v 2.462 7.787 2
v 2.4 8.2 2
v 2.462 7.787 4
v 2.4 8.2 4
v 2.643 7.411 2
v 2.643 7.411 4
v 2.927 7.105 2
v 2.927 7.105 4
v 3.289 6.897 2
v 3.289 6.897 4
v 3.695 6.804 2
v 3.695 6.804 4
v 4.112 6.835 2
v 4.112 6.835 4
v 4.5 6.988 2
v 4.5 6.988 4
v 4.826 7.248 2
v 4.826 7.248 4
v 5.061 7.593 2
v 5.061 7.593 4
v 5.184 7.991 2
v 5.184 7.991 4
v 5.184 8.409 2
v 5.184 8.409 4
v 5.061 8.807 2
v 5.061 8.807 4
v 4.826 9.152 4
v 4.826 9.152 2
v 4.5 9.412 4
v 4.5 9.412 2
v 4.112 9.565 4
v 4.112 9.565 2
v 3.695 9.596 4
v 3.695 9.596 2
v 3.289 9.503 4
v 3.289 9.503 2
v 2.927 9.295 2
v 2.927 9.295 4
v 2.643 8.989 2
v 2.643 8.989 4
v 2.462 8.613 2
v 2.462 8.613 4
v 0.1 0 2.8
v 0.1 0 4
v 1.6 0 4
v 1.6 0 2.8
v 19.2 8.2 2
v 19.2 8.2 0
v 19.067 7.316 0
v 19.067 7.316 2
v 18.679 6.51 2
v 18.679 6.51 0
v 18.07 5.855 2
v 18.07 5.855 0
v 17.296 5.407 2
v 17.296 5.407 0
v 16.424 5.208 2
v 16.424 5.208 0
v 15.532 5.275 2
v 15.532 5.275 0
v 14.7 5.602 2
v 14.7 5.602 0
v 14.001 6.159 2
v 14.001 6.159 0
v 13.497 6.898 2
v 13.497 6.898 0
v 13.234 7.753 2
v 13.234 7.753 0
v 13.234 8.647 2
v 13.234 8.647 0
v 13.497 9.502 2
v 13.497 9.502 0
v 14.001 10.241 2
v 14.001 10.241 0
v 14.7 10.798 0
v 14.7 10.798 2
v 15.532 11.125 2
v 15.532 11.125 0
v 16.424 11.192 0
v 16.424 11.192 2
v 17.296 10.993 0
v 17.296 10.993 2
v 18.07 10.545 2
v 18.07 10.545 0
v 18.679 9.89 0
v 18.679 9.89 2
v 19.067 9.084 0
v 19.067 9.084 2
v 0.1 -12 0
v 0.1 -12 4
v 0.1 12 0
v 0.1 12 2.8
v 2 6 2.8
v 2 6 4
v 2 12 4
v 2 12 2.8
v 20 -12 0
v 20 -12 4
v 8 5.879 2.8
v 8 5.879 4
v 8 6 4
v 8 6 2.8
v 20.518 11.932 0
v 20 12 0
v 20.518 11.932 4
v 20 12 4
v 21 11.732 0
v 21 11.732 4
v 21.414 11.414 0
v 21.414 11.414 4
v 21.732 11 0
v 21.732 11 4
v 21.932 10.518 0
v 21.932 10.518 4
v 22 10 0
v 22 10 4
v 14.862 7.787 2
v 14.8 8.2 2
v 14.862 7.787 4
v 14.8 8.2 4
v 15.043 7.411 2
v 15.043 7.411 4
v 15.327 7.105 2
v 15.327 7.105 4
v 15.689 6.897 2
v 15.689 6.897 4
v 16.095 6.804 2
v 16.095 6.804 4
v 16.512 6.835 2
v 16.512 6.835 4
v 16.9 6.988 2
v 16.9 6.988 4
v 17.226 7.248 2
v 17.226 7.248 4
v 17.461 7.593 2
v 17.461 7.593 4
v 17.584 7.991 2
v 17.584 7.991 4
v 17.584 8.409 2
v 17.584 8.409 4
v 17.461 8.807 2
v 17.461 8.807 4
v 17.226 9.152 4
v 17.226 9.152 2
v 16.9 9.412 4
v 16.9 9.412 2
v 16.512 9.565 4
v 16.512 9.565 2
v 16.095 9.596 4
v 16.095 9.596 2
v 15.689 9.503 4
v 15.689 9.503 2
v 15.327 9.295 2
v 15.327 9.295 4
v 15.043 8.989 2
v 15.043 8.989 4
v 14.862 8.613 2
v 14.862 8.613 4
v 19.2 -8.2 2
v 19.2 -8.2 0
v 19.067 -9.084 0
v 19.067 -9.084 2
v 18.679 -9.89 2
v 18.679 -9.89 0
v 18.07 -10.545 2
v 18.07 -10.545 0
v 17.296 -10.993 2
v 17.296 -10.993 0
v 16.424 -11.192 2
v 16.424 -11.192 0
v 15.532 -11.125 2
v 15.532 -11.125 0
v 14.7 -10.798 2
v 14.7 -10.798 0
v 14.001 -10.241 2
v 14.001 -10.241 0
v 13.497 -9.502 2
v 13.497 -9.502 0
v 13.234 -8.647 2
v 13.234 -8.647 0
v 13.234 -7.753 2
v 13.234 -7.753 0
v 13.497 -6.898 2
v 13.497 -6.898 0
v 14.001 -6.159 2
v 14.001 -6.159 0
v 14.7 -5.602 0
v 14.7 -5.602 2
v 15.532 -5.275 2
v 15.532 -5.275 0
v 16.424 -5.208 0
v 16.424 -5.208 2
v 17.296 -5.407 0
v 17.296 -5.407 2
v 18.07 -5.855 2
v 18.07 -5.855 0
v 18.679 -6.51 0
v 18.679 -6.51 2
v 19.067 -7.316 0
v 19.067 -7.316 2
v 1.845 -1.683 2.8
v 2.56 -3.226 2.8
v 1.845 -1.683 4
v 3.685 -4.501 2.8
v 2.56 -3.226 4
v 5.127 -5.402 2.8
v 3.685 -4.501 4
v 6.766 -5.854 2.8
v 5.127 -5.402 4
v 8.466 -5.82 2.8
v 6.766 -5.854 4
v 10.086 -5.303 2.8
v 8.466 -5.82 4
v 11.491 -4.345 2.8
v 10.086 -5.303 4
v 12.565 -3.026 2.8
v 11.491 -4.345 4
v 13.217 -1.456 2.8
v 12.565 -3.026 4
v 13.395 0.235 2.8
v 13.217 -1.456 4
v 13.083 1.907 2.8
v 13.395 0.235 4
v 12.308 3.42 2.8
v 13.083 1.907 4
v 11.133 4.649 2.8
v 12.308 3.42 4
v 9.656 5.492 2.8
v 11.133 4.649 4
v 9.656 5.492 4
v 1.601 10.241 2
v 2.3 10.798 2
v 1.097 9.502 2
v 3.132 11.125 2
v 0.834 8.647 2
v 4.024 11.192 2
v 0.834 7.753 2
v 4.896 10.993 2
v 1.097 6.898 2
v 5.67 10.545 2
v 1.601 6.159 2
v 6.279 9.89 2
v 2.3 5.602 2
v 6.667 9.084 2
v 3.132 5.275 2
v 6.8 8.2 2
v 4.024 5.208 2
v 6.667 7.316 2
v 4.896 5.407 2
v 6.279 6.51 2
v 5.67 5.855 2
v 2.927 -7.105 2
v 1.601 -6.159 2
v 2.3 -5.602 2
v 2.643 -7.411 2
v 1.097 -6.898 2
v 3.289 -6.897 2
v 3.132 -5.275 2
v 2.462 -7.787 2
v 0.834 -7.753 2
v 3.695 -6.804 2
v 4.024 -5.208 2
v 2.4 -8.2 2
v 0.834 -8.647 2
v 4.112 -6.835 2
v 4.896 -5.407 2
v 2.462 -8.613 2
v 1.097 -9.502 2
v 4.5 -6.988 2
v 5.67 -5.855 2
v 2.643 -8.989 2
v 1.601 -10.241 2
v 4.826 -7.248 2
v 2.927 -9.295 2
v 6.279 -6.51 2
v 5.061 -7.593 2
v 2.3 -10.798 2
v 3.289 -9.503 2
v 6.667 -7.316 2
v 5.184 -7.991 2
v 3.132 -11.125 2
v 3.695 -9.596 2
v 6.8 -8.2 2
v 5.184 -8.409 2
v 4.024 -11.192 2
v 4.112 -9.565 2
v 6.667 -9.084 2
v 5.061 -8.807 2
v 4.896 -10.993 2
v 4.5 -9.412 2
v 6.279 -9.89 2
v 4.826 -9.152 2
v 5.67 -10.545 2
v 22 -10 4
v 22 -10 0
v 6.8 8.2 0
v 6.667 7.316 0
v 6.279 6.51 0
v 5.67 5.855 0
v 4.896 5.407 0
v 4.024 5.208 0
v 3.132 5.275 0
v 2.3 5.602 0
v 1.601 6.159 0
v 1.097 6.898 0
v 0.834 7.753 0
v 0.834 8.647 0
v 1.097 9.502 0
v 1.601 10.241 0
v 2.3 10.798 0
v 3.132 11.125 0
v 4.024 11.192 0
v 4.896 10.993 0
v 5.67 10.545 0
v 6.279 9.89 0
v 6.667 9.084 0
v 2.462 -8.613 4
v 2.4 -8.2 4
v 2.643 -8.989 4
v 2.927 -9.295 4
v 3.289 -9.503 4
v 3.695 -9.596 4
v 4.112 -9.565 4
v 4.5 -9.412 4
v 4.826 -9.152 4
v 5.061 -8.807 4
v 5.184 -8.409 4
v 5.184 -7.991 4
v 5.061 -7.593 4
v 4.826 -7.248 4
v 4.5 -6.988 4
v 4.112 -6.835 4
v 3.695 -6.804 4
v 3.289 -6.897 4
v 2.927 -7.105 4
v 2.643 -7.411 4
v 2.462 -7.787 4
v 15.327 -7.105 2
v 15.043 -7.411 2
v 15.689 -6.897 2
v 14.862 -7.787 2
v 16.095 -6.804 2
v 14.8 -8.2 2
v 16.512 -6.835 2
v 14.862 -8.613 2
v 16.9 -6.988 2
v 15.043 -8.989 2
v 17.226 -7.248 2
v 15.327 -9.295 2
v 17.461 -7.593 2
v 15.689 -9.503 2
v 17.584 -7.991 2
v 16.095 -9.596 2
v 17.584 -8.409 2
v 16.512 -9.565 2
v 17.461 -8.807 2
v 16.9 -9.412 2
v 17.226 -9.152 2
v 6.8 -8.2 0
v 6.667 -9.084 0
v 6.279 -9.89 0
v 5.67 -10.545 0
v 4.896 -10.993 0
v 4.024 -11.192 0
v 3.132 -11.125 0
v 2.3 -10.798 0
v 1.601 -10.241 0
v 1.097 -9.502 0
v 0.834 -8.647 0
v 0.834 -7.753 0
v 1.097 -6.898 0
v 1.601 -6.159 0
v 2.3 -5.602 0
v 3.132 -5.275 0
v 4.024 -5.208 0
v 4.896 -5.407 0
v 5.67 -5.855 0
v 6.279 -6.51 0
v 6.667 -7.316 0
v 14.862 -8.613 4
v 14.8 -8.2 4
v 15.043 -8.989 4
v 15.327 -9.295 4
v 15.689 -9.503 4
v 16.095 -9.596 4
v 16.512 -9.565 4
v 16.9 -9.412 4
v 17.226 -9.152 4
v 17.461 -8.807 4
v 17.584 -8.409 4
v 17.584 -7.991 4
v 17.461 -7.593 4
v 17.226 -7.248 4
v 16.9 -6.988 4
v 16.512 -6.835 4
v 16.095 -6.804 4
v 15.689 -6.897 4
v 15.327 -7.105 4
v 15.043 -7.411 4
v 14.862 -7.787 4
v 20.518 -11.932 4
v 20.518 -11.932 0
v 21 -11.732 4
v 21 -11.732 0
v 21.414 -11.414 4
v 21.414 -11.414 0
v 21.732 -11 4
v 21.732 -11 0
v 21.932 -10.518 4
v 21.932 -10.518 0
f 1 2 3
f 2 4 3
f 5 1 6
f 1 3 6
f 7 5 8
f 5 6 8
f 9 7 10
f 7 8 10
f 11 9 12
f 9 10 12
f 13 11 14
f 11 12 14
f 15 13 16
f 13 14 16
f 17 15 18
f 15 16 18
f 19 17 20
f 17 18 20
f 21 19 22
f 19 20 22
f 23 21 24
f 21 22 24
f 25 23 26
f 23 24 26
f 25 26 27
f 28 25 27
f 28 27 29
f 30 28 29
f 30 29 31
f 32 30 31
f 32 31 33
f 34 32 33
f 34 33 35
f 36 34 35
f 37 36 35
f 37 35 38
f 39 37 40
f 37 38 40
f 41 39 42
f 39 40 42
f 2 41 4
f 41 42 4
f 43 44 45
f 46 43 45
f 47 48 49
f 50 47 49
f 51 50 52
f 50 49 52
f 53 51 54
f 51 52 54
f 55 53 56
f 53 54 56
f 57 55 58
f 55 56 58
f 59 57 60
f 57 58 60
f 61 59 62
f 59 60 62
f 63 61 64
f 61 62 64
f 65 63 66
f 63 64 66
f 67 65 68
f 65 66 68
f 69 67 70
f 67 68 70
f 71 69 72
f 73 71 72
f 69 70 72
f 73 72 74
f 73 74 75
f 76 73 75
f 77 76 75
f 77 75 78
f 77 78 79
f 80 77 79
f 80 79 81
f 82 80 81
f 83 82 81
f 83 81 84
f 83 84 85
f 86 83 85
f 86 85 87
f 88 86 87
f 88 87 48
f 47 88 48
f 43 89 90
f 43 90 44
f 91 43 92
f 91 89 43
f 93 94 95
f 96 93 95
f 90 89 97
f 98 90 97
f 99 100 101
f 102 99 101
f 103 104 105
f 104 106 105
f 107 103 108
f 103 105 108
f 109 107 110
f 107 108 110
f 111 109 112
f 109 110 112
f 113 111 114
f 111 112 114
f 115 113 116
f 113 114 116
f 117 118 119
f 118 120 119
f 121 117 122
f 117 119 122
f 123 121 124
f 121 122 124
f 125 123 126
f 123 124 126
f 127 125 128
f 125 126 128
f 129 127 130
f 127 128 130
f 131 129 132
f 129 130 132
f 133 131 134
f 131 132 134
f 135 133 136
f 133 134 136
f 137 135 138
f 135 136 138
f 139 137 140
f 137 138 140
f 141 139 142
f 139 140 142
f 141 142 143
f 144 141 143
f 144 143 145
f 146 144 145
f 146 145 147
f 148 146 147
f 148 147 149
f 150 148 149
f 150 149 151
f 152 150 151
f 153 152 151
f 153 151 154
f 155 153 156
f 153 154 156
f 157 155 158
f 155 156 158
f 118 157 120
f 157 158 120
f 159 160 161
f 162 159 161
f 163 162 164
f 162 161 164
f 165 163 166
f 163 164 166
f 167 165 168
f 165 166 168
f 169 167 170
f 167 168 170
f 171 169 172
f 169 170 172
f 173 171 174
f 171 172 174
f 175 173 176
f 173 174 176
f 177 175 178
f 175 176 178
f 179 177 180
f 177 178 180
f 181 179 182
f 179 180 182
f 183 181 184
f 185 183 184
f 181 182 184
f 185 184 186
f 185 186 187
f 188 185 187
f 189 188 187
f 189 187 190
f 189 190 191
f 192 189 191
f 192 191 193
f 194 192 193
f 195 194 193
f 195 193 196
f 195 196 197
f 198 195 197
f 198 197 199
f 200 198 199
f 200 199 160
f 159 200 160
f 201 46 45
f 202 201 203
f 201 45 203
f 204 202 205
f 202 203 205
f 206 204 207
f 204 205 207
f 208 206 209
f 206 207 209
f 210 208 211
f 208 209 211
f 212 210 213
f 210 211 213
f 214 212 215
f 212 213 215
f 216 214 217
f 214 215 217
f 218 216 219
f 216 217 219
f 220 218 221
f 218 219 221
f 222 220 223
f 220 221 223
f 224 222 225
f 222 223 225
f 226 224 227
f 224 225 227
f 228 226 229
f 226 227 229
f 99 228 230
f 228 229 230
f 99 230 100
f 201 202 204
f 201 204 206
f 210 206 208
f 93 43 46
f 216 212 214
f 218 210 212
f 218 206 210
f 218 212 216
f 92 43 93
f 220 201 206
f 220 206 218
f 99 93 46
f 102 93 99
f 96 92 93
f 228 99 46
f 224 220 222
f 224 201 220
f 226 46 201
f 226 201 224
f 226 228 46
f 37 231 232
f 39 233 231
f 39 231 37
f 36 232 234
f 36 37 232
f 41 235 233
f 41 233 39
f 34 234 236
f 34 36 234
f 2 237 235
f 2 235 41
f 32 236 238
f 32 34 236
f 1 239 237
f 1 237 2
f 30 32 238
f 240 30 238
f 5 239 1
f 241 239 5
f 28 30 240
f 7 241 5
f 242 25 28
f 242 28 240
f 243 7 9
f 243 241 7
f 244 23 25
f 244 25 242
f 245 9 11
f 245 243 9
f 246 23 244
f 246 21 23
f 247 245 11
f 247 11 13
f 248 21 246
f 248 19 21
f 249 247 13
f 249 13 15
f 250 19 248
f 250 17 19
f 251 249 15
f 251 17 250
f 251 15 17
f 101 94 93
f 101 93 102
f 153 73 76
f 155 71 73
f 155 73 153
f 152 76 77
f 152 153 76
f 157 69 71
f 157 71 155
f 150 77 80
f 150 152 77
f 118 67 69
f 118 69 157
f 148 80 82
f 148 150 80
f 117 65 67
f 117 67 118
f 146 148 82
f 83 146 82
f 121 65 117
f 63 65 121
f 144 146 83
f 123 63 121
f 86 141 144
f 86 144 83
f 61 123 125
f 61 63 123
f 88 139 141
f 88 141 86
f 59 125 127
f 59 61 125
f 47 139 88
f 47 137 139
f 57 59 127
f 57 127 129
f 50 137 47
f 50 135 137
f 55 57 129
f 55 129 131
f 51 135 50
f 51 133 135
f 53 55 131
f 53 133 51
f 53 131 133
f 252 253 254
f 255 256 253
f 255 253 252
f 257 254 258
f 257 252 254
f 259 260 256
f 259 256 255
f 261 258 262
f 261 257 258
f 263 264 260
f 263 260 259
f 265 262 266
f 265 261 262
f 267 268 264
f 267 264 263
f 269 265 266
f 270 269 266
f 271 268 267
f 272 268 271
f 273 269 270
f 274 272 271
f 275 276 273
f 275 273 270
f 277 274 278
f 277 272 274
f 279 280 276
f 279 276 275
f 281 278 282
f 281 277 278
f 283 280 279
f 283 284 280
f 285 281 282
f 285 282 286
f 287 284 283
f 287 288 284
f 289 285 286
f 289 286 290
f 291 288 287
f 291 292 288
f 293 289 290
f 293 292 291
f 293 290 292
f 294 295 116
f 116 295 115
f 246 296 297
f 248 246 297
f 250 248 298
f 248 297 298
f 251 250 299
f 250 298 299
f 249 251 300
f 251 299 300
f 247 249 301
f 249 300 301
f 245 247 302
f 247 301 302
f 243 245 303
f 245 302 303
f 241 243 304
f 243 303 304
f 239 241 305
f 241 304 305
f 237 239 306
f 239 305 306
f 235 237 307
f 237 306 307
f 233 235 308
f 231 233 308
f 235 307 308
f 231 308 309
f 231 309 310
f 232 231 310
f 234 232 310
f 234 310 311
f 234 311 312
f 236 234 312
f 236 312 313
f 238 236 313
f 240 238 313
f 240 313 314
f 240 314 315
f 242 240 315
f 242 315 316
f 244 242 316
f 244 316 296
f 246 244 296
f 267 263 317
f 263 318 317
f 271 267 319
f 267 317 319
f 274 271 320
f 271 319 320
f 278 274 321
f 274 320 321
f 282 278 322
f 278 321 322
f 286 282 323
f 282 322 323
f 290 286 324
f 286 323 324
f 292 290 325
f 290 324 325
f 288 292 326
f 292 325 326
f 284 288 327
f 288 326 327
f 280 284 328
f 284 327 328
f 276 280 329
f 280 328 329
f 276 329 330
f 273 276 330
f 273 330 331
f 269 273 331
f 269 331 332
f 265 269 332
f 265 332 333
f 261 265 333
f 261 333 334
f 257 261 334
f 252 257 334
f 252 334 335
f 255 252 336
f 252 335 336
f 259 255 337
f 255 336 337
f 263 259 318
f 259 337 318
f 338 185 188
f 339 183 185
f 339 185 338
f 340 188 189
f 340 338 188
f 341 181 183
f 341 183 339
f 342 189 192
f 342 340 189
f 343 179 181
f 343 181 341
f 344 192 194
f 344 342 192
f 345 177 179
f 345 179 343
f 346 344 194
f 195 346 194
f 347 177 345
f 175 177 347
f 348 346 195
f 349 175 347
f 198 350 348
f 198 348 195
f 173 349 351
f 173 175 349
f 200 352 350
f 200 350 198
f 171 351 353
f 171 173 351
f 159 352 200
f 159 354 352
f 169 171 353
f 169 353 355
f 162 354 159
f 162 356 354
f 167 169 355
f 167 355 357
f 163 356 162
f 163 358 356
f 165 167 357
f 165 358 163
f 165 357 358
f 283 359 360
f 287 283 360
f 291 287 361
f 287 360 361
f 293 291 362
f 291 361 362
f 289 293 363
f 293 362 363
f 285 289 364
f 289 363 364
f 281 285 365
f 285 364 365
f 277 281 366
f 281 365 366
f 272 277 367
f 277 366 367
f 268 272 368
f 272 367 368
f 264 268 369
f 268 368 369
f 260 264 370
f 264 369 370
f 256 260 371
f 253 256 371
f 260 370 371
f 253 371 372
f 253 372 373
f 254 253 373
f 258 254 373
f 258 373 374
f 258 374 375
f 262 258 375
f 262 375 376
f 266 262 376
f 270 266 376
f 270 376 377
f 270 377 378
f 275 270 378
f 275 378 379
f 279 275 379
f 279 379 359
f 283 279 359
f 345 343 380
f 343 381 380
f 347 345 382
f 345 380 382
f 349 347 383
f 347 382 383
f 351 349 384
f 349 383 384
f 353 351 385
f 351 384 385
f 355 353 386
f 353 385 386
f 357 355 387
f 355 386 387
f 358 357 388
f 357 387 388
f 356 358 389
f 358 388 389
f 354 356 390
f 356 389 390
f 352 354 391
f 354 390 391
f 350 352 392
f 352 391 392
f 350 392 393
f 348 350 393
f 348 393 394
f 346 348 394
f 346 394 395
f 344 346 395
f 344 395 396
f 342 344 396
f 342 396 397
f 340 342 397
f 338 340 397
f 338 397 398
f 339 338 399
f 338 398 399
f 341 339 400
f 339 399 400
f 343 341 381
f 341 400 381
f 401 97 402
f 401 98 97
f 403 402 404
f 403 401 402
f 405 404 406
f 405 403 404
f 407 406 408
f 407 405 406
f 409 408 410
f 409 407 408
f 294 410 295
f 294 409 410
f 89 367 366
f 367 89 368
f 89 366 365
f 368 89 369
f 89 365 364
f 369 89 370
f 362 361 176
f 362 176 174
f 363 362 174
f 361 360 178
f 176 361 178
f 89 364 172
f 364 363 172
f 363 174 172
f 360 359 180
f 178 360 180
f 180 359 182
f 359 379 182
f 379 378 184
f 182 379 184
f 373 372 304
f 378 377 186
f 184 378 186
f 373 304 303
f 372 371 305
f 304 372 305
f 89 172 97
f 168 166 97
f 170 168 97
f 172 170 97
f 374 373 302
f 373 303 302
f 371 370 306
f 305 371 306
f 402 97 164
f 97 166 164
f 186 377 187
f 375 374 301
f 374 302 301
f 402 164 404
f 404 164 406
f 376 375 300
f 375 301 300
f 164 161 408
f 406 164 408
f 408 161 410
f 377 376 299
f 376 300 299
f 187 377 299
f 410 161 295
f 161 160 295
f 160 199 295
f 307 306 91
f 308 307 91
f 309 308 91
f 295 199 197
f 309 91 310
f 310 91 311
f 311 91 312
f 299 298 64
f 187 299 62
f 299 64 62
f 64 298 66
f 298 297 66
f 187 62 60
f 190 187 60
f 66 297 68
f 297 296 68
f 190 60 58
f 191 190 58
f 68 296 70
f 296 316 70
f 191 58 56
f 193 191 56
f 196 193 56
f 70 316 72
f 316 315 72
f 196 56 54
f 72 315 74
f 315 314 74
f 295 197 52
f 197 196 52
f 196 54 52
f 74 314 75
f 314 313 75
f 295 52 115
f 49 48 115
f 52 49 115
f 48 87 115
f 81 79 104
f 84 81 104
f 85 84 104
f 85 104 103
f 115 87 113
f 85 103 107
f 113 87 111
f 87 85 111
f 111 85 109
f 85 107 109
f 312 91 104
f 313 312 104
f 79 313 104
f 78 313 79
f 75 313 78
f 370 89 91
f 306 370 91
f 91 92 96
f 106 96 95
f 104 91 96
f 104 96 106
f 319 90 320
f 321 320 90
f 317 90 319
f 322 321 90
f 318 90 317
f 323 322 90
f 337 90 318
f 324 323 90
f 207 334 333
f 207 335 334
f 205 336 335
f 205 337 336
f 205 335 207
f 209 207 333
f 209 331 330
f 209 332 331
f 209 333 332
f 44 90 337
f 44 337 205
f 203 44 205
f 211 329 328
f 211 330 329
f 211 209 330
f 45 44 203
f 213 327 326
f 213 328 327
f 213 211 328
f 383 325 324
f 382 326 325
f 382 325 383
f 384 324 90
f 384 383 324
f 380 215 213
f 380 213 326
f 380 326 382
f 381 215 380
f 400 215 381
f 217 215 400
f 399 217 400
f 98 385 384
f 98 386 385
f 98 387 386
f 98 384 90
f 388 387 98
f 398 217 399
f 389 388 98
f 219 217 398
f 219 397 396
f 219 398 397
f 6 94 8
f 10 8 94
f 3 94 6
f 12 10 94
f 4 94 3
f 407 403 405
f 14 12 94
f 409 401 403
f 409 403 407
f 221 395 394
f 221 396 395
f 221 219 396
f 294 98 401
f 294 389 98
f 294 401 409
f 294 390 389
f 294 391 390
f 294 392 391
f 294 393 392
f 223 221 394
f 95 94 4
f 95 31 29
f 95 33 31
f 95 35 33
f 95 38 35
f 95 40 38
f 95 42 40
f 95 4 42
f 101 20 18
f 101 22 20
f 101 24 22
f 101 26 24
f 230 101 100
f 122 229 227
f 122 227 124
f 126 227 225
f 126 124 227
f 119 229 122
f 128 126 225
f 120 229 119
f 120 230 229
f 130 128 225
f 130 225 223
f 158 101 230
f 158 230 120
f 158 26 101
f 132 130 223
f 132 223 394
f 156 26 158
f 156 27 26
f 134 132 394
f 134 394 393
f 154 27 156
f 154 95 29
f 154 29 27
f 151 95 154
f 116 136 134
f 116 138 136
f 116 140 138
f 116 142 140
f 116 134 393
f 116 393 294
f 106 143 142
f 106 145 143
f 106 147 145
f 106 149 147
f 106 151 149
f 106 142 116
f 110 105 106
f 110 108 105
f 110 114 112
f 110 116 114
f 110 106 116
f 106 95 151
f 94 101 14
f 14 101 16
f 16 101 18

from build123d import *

# Parameters (mm, degrees)
SKETCH051_W         = 21.9
SKETCH051_H         = 24
PAD014_DEPTH        = 4
SKETCH052_R         = 5.9
POCKET015_DEPTH     = 1.2
SKETCH053_W         = 16
SKETCH053_H         = 6
SKETCH053_W_2       = 4
POCKET016_DEPTH     = 1.2
HOLE022_D           = 2.8
HOLE022_DEPTH       = 25
HOLE022_CBORE_D     = 6
HOLE022_CBORE_DEPTH = 2
FILLET027_R         = 2


with BuildPart() as part:
    # Sketch051 → Pad014 (new body)
    with BuildSketch(Plane.XY):
        with Locations((11.05, 0)):
            Rectangle(SKETCH051_W, SKETCH051_H)
    extrude(amount=PAD014_DEPTH)

    # Sketch052 (on Face6 of Pad014) → Pocket015 (cut)
    with BuildSketch(Plane.XY.offset(4)):
        with Locations((7.5, 0)):
            Circle(SKETCH052_R)
    pocket015 = extrude(amount=-POCKET015_DEPTH, mode=Mode.SUBTRACT)

    # Mirrored025: Pocket015 across Sketch052 V_Axis
    add(pocket015.mirror(Plane(origin=(0, 0, 4), x_dir=(0, 0, 1), z_dir=(1, 0, 0))), mode=Mode.SUBTRACT)

    # Sketch053 (on Face5 of Mirrored025) → Pocket016 (cut)
    with BuildSketch(Plane.XY.offset(4)):
        with Locations((0, 3)):
            Rectangle(SKETCH053_W, SKETCH053_H)
        with Locations((0, 9)):
            Rectangle(SKETCH053_W_2, SKETCH053_H)
    extrude(amount=-POCKET016_DEPTH, mode=Mode.SUBTRACT)

    # Hole022
    with Locations(Plane(origin=(0, 0, 0), x_dir=(1, 0, 0), z_dir=(0, 0, -1))):
        with Locations((16.2, 8.2), (16.2, -8.2), (3.8, 8.2), (3.8, -8.2)):
            hole022 = CounterBoreHole(HOLE022_D / 2, HOLE022_CBORE_D / 2, HOLE022_CBORE_DEPTH, depth=HOLE022_DEPTH)

    # Mirrored026: Hole022 across Sketch054 V_Axis
    add(hole022.mirror(Plane(origin=(0, 0, 0), x_dir=(0, 0, -1), z_dir=(1, 0, 0))), mode=Mode.SUBTRACT)

    # Fillet027
    fillet027_edges = [part.edges().sort_by_distance(p)[0] for p in [
        (22, 12, 2),
        (22, -12, 2),
    ]]
    fillet(fillet027_edges, radius=FILLET027_R)


solid = part.part
